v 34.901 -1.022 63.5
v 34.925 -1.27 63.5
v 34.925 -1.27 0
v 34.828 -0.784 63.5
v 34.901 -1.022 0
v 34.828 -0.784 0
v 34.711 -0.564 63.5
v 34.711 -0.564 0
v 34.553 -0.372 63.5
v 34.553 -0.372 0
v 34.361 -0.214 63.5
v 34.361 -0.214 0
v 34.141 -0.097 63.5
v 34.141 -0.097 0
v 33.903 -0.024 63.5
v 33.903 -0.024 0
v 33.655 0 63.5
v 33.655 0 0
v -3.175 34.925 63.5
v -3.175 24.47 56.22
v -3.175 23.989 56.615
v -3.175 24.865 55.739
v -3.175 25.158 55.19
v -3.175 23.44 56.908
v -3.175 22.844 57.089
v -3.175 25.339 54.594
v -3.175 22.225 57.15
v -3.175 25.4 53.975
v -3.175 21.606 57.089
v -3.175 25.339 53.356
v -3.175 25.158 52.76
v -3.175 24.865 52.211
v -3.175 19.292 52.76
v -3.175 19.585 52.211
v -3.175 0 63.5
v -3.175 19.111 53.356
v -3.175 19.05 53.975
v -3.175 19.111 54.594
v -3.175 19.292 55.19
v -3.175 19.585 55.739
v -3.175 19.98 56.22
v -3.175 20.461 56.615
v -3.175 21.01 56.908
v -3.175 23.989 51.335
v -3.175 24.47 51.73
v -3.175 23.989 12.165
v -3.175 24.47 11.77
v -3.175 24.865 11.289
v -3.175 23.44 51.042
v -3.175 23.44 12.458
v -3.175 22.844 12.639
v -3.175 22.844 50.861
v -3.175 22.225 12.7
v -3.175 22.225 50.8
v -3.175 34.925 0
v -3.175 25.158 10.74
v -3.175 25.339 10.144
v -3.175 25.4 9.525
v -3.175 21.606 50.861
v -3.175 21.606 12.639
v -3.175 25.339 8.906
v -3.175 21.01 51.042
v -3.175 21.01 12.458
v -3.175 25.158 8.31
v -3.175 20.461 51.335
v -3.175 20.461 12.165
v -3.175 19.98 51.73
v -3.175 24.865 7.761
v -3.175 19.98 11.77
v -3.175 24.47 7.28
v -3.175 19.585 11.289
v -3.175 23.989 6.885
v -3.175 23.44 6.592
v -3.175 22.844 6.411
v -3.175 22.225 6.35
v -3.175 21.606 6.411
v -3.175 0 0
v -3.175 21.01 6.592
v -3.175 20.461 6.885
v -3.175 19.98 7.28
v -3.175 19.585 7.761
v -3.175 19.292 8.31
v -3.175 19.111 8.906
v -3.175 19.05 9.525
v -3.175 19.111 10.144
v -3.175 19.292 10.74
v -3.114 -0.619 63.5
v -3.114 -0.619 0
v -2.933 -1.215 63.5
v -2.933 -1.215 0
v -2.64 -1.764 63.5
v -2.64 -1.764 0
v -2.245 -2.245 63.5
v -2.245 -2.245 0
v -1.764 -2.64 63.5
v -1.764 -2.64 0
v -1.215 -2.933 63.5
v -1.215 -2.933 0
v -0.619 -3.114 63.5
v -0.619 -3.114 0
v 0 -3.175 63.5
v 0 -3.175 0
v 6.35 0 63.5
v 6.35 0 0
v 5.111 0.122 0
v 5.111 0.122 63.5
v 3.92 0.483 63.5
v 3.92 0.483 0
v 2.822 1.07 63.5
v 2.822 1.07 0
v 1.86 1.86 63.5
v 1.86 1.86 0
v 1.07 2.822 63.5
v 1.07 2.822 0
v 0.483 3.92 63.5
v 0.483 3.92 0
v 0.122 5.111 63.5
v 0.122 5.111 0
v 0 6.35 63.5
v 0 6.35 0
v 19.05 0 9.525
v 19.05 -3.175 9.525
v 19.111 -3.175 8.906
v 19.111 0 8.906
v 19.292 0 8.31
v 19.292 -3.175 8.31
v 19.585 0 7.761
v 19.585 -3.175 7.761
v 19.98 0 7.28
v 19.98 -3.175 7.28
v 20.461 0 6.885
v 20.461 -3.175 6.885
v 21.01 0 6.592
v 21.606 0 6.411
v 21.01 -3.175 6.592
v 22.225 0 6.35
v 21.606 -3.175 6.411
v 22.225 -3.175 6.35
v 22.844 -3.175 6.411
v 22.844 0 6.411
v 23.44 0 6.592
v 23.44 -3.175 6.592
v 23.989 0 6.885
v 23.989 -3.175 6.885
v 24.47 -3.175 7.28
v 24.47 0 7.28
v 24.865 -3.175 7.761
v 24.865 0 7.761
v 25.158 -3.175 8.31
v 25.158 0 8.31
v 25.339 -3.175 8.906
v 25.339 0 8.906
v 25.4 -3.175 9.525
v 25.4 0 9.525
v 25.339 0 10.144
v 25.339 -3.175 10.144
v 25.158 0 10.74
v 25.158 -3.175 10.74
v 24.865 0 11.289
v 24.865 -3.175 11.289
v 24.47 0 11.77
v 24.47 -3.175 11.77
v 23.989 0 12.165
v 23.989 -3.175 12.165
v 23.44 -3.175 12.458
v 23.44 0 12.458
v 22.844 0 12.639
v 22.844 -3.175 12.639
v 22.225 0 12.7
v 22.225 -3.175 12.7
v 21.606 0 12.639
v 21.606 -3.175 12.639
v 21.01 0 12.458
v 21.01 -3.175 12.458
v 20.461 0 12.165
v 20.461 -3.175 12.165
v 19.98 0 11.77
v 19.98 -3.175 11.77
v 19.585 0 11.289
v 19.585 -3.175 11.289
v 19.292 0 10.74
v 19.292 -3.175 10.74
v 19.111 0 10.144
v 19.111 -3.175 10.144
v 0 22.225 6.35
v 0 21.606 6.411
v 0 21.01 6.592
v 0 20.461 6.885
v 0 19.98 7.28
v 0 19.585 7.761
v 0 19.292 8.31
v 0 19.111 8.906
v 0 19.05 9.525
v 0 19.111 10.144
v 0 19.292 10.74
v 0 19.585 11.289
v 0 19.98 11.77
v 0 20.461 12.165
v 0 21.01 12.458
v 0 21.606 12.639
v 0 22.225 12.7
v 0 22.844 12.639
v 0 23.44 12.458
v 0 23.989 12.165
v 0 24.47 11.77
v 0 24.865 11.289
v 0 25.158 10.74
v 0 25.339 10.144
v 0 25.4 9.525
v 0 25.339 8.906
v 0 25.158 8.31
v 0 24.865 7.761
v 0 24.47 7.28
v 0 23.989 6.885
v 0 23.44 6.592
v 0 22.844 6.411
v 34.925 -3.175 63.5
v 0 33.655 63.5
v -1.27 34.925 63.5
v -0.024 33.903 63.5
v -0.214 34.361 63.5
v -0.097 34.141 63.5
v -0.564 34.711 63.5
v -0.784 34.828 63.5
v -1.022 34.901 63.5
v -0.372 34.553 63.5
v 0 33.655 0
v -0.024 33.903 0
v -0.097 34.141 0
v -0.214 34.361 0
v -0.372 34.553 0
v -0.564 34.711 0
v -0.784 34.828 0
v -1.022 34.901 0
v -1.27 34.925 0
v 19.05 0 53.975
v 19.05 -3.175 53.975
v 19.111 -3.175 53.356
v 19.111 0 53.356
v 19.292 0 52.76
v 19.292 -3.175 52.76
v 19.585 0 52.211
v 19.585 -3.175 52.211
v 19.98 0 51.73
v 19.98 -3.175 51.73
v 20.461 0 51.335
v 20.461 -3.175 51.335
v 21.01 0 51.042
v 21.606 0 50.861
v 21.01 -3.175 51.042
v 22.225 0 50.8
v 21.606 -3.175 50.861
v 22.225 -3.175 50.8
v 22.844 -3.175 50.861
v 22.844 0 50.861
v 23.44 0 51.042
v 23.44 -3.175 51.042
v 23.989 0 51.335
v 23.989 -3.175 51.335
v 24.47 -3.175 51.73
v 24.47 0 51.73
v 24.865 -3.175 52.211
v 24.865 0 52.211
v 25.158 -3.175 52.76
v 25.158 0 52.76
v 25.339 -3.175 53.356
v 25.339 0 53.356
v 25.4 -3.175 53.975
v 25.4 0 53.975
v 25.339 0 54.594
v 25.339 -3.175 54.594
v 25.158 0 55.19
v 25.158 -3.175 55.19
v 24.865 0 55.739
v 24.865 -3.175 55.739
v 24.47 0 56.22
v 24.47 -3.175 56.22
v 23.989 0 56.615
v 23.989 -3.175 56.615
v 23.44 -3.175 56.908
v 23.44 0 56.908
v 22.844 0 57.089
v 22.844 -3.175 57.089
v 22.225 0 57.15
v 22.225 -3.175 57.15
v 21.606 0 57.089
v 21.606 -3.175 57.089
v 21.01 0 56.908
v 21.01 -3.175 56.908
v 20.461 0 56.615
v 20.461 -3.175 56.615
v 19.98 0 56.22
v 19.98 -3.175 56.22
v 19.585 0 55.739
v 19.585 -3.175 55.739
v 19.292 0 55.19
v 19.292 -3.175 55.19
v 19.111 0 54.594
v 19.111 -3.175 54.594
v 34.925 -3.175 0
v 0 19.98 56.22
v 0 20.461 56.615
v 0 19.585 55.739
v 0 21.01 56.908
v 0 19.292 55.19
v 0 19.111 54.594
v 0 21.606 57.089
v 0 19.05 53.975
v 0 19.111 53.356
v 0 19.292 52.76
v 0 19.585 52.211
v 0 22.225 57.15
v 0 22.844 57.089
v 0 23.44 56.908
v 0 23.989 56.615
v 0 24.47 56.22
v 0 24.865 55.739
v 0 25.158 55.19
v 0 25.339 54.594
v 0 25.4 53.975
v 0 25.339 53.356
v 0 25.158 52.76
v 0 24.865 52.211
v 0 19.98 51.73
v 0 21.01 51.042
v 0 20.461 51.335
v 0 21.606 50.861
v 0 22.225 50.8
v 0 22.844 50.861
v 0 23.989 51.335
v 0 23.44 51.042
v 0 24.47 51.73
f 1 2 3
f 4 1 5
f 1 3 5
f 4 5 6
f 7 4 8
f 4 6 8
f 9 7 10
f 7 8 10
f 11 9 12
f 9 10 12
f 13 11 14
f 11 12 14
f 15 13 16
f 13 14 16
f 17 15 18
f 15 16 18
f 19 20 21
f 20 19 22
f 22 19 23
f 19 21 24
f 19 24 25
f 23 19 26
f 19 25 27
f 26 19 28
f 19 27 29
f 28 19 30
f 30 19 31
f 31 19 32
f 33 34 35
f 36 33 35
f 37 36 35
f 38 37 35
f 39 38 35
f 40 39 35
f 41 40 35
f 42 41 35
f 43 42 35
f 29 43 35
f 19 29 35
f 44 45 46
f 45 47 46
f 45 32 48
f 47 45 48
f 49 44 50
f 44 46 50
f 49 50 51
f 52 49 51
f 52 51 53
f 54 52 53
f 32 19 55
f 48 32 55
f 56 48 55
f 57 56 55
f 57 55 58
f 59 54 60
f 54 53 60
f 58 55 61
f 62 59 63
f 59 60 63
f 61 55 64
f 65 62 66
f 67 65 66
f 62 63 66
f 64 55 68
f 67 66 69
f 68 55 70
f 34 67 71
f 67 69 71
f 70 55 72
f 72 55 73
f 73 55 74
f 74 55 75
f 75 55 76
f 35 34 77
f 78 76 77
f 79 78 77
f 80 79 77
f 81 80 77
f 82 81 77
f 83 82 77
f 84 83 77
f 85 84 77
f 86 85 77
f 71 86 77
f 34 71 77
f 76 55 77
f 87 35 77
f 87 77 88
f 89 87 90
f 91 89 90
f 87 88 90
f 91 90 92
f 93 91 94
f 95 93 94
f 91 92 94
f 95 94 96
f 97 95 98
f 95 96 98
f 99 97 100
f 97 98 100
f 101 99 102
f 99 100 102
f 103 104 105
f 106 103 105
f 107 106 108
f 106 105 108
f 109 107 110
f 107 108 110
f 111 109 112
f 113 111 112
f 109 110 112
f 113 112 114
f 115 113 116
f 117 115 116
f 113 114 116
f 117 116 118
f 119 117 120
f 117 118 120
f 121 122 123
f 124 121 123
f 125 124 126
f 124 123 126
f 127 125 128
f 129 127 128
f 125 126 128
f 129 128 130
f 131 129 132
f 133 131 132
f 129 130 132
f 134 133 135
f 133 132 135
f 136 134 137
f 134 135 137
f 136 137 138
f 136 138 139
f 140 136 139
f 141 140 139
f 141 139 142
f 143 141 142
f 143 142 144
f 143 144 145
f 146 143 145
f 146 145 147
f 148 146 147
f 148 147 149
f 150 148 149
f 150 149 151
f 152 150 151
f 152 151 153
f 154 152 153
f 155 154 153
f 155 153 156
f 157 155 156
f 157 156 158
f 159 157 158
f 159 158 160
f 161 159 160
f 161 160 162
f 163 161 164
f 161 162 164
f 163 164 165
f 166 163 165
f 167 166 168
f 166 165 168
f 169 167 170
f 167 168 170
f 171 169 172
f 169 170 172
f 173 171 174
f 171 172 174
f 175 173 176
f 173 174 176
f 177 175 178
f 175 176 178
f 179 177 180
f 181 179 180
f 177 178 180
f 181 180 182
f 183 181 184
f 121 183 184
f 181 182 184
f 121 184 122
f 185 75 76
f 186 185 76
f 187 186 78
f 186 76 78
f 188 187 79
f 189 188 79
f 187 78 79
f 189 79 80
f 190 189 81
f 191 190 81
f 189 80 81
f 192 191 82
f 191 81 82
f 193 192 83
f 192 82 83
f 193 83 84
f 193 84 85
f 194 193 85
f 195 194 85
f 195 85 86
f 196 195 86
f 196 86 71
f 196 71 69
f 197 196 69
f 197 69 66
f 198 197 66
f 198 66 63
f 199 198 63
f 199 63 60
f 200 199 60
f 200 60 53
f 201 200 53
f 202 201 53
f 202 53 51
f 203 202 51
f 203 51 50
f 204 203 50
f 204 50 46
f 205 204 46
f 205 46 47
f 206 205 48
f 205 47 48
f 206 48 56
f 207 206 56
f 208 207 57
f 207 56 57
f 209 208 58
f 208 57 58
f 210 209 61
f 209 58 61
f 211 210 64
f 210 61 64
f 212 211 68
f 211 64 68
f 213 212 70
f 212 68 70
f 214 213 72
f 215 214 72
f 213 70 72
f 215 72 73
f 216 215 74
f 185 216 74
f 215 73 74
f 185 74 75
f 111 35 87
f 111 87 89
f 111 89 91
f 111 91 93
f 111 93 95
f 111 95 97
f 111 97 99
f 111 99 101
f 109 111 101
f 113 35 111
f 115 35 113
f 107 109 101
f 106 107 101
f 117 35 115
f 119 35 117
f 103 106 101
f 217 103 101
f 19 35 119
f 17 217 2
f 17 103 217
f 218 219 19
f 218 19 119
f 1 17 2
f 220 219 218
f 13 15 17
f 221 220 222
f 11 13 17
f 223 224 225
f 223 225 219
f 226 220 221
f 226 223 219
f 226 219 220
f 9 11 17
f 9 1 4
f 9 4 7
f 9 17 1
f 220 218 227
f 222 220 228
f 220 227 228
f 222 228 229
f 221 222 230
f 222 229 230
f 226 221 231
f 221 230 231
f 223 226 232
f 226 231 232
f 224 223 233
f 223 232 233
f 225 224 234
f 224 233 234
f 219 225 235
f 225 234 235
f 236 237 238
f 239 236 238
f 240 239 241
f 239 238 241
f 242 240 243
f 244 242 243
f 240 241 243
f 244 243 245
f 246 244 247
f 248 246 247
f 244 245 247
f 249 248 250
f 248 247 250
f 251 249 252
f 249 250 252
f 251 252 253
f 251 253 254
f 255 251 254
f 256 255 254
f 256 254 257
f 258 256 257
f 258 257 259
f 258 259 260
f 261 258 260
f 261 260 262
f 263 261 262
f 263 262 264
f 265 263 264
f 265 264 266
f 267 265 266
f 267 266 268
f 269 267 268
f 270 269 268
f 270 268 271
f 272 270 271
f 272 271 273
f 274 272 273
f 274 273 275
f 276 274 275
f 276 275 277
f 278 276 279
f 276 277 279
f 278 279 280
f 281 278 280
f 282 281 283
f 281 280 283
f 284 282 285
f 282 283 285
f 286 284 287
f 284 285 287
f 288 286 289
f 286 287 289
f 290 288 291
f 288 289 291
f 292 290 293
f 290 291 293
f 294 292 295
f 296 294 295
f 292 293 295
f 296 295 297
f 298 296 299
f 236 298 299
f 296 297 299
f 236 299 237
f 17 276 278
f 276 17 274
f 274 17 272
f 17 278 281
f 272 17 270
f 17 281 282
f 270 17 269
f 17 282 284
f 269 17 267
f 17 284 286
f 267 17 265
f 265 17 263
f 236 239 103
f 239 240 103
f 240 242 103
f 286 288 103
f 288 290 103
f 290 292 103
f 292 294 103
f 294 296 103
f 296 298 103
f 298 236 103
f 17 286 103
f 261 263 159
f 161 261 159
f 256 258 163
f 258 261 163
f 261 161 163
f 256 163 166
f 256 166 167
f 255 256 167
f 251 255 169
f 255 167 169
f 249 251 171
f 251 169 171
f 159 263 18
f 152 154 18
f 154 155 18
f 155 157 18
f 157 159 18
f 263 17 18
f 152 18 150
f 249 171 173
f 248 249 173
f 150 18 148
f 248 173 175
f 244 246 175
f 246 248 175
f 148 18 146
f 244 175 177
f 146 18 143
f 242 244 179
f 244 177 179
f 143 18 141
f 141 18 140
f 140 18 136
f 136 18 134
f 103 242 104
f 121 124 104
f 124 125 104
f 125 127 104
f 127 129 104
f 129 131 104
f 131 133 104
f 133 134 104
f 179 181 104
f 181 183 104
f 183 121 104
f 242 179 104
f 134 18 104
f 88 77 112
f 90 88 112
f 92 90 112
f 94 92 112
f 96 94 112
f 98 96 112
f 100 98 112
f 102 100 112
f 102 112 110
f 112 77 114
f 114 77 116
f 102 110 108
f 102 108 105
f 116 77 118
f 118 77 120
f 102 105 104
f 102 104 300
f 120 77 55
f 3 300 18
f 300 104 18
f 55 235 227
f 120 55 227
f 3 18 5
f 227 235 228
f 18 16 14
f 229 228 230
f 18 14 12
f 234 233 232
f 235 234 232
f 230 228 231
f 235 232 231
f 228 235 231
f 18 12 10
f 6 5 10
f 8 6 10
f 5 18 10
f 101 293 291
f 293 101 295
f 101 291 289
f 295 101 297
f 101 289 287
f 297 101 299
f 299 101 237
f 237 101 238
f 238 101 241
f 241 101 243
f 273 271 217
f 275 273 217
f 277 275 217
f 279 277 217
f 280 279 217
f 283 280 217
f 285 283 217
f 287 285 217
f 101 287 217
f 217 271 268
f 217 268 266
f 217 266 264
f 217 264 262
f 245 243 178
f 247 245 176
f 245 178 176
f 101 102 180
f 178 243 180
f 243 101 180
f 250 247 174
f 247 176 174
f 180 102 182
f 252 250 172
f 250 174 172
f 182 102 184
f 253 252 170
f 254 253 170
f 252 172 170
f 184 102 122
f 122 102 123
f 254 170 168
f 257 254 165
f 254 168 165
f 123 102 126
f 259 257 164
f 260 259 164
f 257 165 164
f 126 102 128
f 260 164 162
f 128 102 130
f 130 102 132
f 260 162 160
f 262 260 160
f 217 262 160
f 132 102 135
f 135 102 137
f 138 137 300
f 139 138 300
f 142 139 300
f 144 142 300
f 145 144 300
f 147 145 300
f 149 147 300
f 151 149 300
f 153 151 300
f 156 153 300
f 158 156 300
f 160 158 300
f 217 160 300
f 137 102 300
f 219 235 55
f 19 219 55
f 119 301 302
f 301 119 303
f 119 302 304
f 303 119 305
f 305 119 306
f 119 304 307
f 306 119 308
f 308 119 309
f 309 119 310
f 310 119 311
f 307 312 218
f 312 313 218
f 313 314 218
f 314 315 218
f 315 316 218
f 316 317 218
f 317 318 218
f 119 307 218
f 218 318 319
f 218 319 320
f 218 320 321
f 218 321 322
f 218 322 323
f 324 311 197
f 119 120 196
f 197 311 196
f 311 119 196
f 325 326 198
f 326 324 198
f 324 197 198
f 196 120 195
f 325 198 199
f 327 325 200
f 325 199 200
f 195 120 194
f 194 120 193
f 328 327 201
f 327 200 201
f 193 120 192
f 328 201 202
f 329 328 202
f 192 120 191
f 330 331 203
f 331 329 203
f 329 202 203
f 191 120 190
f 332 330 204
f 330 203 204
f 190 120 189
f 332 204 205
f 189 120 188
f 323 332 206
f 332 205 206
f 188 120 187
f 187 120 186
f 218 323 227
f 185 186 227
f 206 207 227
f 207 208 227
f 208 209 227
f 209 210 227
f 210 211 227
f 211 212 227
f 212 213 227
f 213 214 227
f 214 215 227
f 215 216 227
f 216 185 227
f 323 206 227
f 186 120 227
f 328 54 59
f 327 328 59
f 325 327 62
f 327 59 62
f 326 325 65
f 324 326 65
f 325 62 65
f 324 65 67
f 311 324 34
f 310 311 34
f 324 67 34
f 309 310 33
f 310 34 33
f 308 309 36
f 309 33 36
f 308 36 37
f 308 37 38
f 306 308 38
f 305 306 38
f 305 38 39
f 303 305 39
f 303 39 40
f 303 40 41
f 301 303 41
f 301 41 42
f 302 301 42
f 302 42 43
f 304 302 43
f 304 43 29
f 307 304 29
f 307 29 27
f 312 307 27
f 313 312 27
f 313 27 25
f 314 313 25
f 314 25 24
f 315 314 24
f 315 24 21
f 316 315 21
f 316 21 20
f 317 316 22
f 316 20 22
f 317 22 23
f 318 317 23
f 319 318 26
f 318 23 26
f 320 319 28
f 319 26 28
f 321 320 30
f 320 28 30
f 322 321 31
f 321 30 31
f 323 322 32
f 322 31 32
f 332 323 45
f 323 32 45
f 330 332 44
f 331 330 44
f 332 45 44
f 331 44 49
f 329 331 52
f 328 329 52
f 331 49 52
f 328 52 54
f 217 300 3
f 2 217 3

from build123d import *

# Parameters (mm, degrees)
BOSS_EXTRUDE1_DEPTH                   = 63.5
F_1_4_0_25_DIAMETER_HOLE1_D           = 6.35
F_1_4_0_25_DIAMETER_HOLE1_ON_FACE_2_D = 6.35


with BuildPart() as part:
    # Sketch3 → Boss-Extrude1 (new body)
    with BuildSketch(Plane.XY):
        with BuildLine():
            Line((0, 6.35), (0, 33.655))
            ThreePointArc((0, 33.655), (-0.371974388, 34.553025612), (-1.27, 34.925))
            Line((-1.27, 34.925), (-3.175, 34.925))
            Line((-3.175, 34.925), (-3.175, 0))
            ThreePointArc((-3.175, 0), (-2.24506403, -2.24506403), (0, -3.175))
            Line((0, -3.175), (34.925, -3.175))
            Line((34.925, -3.175), (34.925, -1.27))
            ThreePointArc((34.925, -1.27), (34.553025612, -0.371974388), (33.655, 0))
            Line((33.655, 0), (6.35, 0))
            ThreePointArc((6.35, 0), (1.859871939, 1.859871939), (0, 6.35))
        make_face()
    extrude(amount=BOSS_EXTRUDE1_DEPTH)

    # 1/4 (0.25) Diameter Hole1 (through all)
    with Locations(Plane(origin=(22.225, 0, 53.975), x_dir=(1, 0, 0), z_dir=(0, 1, 0))):
        with Locations((0, 0), (0, 44.45)):
            Hole(F_1_4_0_25_DIAMETER_HOLE1_D / 2)

    # 1/4 (0.25) Diameter Hole1 on face 2 (through all)
    with Locations(Plane(origin=(0, 22.225, 9.525), x_dir=(0, 0, 1), z_dir=(1, 0, 0))):
        with Locations((0, 0), (44.45, 0)):
            Hole(F_1_4_0_25_DIAMETER_HOLE1_ON_FACE_2_D / 2)


solid = part.part
